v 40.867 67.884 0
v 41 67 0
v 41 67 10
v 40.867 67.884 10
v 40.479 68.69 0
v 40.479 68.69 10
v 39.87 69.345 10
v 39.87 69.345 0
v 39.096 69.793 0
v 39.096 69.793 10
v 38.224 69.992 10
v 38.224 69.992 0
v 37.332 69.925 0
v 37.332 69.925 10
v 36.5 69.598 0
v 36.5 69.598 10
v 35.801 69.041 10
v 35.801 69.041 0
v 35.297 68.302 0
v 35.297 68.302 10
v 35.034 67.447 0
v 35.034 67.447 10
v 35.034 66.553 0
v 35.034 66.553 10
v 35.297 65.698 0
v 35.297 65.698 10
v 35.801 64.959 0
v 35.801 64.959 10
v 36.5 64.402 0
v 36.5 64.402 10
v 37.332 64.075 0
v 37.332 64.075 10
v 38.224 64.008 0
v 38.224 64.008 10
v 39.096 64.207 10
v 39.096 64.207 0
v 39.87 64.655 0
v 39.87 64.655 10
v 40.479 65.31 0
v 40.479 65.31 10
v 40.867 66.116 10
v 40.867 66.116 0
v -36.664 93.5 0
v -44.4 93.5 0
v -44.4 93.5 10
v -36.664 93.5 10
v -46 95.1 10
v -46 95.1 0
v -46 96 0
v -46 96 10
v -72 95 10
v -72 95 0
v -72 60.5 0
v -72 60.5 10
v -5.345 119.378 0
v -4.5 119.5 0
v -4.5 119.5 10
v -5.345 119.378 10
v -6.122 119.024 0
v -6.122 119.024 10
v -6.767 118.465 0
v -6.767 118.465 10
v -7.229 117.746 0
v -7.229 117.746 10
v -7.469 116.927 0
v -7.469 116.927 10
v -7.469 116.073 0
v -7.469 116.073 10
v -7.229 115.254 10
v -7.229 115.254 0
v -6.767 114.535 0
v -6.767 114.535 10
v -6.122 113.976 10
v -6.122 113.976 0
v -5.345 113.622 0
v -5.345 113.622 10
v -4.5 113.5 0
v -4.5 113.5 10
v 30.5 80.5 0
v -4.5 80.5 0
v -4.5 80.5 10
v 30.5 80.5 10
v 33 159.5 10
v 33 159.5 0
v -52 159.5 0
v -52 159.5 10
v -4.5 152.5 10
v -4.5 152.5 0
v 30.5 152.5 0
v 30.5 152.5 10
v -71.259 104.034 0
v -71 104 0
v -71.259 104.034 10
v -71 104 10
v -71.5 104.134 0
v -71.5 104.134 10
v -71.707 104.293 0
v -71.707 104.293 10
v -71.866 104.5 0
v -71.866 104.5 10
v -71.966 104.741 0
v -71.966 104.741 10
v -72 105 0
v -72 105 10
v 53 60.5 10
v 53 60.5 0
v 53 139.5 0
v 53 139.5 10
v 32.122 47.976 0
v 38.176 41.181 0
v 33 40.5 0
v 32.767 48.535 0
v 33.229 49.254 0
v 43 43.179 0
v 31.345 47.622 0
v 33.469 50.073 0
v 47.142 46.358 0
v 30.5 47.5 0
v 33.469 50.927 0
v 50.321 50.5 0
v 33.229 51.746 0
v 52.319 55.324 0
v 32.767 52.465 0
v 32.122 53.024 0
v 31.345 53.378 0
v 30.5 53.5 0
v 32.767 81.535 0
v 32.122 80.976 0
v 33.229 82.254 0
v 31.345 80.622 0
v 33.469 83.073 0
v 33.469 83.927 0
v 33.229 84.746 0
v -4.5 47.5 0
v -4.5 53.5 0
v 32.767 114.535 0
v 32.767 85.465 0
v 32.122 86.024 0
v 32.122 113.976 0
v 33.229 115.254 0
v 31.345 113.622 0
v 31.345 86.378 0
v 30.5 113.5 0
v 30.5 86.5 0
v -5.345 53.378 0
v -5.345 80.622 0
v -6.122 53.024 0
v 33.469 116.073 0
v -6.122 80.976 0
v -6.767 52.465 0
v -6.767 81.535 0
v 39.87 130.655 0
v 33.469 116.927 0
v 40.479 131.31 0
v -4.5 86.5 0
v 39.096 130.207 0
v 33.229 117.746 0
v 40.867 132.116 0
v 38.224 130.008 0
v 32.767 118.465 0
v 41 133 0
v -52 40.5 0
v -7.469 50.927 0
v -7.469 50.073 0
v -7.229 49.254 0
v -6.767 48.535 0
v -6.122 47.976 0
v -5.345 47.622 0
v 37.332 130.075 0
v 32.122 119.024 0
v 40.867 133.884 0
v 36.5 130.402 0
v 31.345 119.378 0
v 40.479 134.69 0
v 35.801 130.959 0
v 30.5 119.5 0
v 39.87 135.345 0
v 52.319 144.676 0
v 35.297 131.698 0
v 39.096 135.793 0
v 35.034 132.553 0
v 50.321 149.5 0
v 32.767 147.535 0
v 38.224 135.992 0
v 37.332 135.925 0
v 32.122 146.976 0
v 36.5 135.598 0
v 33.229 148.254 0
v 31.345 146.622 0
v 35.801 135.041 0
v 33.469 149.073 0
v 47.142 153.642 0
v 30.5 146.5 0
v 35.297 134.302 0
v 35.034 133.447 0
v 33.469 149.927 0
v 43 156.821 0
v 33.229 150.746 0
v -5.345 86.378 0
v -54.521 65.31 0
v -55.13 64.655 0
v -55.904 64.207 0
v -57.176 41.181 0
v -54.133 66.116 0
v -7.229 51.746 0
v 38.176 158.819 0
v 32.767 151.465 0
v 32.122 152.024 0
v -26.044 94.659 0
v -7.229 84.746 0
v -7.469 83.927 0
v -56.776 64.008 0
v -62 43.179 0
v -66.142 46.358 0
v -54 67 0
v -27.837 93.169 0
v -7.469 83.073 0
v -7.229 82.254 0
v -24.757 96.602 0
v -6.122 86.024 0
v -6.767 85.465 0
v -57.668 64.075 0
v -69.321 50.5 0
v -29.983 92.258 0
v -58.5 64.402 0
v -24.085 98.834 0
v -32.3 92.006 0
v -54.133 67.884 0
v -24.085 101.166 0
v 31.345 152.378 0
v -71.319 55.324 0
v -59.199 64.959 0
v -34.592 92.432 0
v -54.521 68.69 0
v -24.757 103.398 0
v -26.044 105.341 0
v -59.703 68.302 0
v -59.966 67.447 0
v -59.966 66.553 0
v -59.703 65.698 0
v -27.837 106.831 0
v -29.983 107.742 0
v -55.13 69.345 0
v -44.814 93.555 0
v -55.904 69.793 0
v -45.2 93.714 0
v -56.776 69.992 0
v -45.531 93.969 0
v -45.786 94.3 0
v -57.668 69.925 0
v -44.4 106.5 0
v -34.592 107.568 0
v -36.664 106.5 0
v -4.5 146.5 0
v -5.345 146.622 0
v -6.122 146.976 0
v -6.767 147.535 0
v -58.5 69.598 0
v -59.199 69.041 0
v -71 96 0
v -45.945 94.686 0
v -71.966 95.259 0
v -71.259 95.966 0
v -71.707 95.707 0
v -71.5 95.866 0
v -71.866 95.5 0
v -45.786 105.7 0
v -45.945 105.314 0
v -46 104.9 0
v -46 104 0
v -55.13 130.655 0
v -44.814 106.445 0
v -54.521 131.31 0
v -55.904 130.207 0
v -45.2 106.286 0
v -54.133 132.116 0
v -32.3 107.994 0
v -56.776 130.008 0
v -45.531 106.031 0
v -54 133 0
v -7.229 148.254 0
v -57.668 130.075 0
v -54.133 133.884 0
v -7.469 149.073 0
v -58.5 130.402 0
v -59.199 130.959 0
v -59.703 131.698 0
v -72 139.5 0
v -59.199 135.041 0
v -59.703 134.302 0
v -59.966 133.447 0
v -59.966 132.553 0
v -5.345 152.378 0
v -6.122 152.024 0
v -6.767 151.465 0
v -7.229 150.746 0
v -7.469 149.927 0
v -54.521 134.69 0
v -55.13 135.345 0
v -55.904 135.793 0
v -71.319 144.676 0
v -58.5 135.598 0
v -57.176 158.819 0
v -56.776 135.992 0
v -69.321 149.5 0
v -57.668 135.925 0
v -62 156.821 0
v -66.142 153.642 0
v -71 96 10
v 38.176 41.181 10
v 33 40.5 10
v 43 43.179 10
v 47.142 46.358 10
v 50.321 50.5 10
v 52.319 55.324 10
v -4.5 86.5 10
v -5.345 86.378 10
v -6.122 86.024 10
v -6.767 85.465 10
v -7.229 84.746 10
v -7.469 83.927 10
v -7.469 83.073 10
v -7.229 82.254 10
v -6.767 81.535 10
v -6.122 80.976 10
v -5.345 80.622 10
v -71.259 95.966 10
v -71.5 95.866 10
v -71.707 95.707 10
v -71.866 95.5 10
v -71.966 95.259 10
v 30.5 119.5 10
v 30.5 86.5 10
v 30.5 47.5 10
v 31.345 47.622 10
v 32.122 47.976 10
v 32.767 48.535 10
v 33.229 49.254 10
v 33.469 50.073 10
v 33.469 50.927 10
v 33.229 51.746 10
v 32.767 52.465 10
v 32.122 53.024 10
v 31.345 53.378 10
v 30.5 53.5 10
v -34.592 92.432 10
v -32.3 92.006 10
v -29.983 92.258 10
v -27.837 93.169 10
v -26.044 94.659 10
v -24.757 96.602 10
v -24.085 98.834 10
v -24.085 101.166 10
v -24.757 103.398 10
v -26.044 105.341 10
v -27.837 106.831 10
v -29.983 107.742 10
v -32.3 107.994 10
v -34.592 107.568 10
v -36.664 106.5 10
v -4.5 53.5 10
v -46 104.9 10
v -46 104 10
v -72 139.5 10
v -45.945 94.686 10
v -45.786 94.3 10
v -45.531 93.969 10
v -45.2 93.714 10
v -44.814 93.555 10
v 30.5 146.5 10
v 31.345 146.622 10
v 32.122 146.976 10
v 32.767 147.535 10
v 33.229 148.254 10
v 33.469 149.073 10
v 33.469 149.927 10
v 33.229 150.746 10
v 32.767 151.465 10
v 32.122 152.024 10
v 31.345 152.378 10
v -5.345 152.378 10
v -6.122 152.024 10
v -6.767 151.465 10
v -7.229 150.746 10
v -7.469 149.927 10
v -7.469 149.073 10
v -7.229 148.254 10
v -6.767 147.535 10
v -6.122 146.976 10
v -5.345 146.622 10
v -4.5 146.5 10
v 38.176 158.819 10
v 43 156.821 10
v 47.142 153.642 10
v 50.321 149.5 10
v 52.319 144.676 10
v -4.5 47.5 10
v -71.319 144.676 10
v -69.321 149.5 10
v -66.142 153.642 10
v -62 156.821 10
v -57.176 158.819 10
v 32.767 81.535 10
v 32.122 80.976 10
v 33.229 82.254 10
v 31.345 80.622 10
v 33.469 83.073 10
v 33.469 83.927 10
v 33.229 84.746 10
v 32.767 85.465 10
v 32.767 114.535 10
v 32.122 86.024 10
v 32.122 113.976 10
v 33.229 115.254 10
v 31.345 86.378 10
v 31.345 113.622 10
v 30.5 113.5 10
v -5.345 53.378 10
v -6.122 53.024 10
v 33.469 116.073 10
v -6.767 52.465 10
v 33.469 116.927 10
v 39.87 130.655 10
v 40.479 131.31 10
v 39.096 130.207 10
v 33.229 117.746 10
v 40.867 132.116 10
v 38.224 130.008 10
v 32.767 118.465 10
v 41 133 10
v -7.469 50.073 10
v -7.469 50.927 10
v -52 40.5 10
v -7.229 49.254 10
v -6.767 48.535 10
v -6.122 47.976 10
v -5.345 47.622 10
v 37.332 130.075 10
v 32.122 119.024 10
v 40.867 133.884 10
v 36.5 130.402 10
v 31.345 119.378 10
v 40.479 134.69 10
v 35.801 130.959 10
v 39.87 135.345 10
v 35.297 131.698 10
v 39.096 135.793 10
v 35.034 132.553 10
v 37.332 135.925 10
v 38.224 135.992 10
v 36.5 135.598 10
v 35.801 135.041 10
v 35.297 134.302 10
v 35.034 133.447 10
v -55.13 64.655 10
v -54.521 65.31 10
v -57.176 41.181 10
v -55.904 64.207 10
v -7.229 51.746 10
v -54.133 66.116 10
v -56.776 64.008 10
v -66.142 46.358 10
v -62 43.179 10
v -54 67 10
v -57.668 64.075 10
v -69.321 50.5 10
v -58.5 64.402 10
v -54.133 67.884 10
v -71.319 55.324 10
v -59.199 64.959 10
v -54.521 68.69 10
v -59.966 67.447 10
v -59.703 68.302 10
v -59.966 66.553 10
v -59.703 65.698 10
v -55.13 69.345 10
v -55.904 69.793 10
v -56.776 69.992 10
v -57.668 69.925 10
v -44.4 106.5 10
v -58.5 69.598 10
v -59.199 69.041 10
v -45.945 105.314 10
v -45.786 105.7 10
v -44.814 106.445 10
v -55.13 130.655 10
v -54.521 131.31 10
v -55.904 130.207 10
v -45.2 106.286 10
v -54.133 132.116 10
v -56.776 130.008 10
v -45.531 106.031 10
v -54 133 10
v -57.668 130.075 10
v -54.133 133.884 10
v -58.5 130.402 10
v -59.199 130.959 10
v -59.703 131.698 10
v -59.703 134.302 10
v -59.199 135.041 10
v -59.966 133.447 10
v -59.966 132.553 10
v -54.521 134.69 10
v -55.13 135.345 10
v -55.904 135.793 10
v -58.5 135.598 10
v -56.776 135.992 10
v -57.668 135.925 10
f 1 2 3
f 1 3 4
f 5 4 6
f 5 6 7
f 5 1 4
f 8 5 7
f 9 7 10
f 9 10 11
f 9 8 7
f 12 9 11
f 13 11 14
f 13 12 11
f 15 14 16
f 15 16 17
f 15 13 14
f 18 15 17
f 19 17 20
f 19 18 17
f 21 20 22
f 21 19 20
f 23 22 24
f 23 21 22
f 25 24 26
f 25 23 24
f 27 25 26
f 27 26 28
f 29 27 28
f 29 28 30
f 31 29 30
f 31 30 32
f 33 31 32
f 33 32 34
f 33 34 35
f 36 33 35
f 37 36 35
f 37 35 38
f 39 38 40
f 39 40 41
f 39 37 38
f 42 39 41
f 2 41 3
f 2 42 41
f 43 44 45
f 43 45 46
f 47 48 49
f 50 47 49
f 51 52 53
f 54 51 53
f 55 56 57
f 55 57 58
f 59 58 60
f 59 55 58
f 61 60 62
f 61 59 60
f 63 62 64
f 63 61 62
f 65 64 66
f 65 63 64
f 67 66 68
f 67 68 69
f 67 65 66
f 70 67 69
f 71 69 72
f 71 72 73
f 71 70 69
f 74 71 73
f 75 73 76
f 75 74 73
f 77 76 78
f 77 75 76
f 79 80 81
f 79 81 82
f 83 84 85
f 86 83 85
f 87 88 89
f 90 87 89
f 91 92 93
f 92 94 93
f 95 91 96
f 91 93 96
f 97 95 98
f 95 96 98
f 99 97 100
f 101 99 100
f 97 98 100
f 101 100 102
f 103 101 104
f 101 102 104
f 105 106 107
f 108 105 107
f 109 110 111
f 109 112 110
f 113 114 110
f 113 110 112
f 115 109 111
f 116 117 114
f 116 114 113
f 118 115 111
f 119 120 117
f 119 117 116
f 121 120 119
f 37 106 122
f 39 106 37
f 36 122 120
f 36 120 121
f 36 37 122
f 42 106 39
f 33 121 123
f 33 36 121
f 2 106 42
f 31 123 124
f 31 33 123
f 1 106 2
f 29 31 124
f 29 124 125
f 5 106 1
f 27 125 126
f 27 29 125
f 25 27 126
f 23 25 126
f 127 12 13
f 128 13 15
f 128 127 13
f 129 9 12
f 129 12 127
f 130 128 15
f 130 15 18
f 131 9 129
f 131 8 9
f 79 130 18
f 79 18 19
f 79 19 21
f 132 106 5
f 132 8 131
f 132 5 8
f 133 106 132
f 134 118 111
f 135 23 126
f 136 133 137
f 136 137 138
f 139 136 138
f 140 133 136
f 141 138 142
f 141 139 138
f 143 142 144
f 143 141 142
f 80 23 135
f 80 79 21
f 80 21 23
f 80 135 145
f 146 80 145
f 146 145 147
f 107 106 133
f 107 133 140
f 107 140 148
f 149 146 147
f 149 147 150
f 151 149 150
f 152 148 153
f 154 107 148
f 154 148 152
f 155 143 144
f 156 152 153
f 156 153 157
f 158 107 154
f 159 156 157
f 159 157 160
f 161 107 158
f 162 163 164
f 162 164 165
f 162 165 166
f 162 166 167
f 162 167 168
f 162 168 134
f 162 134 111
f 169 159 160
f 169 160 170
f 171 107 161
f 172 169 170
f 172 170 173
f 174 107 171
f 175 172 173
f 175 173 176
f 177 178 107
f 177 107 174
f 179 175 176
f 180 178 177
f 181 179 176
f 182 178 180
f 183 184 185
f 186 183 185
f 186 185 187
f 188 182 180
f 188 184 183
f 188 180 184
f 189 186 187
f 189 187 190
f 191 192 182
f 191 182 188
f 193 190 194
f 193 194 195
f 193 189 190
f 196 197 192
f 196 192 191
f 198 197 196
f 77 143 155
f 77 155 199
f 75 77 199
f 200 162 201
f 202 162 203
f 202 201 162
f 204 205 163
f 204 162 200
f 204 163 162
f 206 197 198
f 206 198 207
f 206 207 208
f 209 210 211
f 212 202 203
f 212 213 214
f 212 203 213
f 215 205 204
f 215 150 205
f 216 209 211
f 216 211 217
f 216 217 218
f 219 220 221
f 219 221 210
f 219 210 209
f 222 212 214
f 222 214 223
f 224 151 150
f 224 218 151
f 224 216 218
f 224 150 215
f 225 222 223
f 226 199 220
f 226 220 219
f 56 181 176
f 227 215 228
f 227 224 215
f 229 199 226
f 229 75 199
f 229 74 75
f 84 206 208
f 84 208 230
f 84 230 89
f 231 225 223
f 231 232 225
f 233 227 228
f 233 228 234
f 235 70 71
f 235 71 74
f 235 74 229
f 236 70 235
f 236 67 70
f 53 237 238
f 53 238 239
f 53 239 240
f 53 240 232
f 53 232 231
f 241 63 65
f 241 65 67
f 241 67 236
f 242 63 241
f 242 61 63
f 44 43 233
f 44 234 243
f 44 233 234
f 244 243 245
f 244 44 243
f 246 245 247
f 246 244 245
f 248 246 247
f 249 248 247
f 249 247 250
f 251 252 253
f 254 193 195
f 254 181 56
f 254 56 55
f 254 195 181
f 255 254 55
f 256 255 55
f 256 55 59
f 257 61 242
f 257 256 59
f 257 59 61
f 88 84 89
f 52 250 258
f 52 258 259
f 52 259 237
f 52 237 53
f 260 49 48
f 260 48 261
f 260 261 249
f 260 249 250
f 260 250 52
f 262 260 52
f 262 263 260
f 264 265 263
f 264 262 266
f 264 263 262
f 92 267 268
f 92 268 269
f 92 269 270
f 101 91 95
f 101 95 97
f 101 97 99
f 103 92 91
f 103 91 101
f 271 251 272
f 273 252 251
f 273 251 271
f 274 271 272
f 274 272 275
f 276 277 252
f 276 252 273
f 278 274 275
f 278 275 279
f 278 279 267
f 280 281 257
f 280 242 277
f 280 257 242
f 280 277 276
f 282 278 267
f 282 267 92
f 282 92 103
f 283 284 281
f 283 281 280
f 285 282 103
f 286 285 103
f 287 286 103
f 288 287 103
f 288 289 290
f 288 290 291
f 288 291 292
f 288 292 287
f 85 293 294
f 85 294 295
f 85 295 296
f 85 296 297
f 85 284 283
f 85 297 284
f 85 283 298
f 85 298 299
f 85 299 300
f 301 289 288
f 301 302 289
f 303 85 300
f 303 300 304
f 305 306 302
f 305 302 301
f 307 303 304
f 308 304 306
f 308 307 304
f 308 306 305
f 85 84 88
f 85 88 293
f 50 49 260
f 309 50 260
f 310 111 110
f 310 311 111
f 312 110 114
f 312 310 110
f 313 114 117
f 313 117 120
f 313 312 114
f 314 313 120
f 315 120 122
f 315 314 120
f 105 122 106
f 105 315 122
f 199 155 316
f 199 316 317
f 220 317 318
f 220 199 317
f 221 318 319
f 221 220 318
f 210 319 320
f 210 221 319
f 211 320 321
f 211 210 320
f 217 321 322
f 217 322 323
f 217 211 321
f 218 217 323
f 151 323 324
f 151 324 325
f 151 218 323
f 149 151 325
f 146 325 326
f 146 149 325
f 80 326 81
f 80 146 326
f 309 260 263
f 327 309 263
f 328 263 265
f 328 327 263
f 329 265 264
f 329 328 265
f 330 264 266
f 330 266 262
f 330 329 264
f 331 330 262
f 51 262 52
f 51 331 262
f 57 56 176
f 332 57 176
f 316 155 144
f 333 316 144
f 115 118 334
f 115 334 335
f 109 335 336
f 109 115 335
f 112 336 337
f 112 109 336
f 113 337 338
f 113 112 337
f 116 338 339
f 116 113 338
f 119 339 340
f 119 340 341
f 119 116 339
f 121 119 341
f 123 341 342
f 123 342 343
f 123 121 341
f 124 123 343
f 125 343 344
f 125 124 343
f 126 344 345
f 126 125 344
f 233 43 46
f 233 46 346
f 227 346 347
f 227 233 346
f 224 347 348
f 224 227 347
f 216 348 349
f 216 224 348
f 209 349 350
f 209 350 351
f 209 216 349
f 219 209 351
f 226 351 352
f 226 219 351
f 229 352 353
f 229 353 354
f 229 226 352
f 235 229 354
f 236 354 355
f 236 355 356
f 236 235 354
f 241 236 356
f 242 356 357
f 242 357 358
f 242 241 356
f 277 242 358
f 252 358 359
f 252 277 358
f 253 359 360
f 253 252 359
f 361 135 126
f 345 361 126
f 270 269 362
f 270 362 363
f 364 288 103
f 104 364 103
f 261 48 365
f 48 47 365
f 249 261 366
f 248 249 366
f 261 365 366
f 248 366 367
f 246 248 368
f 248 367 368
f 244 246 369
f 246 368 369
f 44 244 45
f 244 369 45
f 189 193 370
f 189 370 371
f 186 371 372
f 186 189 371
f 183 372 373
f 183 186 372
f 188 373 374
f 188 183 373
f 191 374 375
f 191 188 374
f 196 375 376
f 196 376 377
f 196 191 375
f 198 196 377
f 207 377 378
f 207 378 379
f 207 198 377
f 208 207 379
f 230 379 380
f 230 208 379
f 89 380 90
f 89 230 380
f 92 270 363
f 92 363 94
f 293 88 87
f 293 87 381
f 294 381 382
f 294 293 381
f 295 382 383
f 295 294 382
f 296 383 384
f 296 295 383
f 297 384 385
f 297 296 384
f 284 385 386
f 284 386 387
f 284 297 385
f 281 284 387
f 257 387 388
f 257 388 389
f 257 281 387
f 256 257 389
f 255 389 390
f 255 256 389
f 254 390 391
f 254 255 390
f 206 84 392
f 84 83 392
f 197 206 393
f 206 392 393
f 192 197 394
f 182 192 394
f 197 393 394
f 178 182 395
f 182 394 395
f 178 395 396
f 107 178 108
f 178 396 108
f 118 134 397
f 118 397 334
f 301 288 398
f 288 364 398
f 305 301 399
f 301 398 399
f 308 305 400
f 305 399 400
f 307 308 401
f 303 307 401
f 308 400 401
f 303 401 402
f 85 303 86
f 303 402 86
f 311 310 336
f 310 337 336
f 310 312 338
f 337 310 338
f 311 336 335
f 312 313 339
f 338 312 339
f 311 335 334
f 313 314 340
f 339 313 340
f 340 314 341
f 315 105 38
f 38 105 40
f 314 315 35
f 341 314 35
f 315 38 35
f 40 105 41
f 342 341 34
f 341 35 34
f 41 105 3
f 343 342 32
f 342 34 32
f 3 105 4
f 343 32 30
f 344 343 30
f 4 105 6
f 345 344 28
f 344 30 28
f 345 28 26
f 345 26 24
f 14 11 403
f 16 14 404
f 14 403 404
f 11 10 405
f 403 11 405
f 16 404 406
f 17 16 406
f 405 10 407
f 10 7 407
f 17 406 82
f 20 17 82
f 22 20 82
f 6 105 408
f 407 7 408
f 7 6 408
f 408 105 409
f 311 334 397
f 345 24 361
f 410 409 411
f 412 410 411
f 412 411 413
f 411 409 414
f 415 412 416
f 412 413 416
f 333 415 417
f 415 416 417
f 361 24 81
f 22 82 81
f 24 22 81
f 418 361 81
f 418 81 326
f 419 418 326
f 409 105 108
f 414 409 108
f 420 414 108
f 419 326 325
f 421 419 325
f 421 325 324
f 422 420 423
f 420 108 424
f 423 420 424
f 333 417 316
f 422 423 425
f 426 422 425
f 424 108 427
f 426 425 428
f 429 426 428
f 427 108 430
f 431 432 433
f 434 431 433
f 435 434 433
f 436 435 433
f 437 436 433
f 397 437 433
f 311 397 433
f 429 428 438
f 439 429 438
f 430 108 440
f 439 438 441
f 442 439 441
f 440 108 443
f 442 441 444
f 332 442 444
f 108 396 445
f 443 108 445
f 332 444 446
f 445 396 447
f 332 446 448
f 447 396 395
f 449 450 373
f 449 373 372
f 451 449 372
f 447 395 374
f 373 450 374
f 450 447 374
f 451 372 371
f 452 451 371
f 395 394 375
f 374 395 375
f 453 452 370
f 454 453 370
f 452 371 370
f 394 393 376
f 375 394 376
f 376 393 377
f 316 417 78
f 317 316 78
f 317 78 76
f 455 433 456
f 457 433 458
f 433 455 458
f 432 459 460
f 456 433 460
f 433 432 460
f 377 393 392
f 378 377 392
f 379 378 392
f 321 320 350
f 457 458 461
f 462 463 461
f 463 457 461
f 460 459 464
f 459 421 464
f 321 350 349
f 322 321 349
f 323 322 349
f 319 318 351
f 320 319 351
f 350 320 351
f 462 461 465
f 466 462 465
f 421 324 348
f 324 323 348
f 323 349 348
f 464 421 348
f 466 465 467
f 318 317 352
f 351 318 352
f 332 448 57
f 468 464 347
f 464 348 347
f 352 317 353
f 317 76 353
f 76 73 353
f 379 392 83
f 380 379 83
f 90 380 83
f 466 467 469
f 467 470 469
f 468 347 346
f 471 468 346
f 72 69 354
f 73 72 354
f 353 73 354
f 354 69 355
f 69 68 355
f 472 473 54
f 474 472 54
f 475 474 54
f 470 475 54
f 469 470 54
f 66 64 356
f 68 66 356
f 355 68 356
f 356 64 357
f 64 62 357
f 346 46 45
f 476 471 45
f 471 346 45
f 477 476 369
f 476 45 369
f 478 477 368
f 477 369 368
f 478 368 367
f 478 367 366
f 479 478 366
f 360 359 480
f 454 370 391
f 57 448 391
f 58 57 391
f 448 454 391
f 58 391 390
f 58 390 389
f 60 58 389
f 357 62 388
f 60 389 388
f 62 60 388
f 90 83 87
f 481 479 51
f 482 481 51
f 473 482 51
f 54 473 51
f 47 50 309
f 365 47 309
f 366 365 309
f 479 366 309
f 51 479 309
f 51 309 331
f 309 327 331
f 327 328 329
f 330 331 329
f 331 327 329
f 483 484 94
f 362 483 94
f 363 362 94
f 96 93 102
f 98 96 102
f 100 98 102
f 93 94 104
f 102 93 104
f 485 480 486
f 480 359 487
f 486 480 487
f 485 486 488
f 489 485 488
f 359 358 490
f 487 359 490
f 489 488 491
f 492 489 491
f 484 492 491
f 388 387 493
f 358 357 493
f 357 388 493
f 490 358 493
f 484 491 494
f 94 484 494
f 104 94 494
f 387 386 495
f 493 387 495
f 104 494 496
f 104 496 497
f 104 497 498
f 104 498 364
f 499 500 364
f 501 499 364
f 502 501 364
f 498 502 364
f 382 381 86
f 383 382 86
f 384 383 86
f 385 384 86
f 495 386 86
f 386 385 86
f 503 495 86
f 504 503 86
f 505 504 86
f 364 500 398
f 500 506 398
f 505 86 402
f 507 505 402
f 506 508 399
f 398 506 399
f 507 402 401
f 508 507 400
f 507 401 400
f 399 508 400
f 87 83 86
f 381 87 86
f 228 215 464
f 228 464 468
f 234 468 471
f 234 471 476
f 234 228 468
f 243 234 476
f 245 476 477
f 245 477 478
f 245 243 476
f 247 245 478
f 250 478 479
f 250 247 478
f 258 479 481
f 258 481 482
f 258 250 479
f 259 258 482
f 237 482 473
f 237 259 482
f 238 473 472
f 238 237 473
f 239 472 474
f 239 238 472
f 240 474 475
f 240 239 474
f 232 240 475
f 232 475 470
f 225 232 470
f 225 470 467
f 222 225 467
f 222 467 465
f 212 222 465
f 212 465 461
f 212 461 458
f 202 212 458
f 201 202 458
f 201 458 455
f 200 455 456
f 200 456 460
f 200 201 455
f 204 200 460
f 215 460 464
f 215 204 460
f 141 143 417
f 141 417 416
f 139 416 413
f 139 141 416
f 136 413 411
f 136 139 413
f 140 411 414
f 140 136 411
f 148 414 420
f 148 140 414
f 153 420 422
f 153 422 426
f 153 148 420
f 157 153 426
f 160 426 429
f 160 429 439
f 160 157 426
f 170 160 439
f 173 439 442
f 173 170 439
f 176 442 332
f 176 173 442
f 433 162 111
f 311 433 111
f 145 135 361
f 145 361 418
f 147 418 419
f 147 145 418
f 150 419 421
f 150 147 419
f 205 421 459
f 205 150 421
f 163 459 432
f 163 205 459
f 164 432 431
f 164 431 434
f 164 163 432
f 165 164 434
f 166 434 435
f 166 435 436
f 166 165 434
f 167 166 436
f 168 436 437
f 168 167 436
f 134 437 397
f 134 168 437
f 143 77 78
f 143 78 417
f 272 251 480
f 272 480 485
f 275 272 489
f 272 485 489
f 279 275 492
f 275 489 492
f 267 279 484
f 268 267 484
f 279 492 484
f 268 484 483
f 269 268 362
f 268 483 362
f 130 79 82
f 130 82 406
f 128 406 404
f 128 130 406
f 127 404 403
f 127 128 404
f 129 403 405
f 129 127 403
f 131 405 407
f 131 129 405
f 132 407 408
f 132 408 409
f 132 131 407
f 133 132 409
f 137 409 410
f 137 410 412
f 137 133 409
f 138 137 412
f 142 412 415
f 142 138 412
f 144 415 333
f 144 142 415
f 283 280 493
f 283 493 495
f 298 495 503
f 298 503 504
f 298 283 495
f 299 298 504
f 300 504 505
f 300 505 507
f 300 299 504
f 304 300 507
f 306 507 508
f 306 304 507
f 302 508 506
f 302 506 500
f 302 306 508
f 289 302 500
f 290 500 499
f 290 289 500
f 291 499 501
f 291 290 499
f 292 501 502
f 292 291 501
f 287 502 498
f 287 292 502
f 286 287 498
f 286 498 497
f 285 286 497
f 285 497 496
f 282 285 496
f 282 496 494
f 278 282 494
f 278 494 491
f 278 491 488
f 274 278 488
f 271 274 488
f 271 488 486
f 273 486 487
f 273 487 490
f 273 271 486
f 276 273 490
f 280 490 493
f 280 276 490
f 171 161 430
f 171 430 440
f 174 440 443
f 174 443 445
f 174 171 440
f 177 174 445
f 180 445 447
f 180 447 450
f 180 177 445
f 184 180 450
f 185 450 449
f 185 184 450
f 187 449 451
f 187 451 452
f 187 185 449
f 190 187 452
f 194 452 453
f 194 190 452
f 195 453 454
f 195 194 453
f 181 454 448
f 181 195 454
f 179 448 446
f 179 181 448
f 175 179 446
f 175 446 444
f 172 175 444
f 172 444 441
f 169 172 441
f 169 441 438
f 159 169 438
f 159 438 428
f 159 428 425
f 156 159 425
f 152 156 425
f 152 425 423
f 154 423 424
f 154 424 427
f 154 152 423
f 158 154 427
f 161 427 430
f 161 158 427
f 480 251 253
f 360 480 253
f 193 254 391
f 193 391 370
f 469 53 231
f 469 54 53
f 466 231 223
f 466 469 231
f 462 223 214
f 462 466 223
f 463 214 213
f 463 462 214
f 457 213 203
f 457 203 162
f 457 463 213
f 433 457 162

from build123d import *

# Parameters (mm, degrees)
SKETCH_R    = 3
PAD_DEPTH   = 10
FILLET_R    = 20
FILLET001_R = 1.6
FILLET002_R = 1


with BuildPart() as part:
    # Sketch → Pad (new body)
    with BuildSketch(Plane.XY):
        with BuildLine():
            ThreePointArc((-36.66369, 93.5), (-24, 100), (-36.66369, 106.5))
            Line((-46, 106.5), (-36.66369, 106.5))
            Line((-46, 106.5), (-46, 104))
            Line((-46, 104), (-72, 104))
            Line((-72, 159.5), (-72, 104))
            Line((53, 159.5), (-72, 159.5))
            Line((53, 40.5), (53, 159.5))
            Line((-72, 40.5), (53, 40.5))
            Line((-72, 96), (-72, 40.5))
            Line((-46, 96), (-72, 96))
            Line((-46, 93.5), (-46, 96))
            Line((-46, 93.5), (-36.66369, 93.5))
        make_face()
        with Locations((-57, 133)):
            Circle(SKETCH_R, mode=Mode.SUBTRACT)
        with Locations((-57, 67)):
            Circle(SKETCH_R, mode=Mode.SUBTRACT)
        with Locations((38, 133)):
            Circle(SKETCH_R, mode=Mode.SUBTRACT)
        with Locations((38, 67)):
            Circle(SKETCH_R, mode=Mode.SUBTRACT)
        with BuildLine():
            ThreePointArc((-4.5, 152.5), (-7.5, 149.5), (-4.5, 146.5))
            Line((-4.5, 146.5), (30.5, 146.5))
            ThreePointArc((30.5, 146.5), (33.5, 149.5), (30.5, 152.5))
            Line((-4.5, 152.5), (30.5, 152.5))
        make_face(mode=Mode.SUBTRACT)
        with BuildLine():
            ThreePointArc((-4.5, 119.5), (-7.5, 116.5), (-4.5, 113.5))
            Line((-4.5, 113.5), (30.5, 113.5))
            ThreePointArc((30.5, 113.5), (33.5, 116.5), (30.5, 119.5))
            Line((-4.5, 119.5), (30.5, 119.5))
        make_face(mode=Mode.SUBTRACT)
        with BuildLine():
            ThreePointArc((-4.5, 86.5), (-7.5, 83.5), (-4.5, 80.5))
            Line((-4.5, 80.5), (30.5, 80.5))
            ThreePointArc((30.5, 80.5), (33.5, 83.5), (30.5, 86.5))
            Line((-4.5, 86.5), (30.5, 86.5))
        make_face(mode=Mode.SUBTRACT)
        with BuildLine():
            ThreePointArc((-4.5, 53.5), (-7.5, 50.5), (-4.5, 47.5))
            Line((-4.5, 47.5), (30.5, 47.5))
            ThreePointArc((30.5, 47.5), (33.5, 50.5), (30.5, 53.5))
            Line((-4.5, 53.5), (30.5, 53.5))
        make_face(mode=Mode.SUBTRACT)
    extrude(amount=PAD_DEPTH)

    # Fillet
    fillet_edges = [part.edges().sort_by_distance(p)[0] for p in [
        (-72, 159.5, 5),
        (53, 40.5, 5),
        (-72, 40.5, 5),
        (53, 159.5, 5),
    ]]
    fillet(fillet_edges, radius=FILLET_R)

    # Fillet001
    fillet001_edges = [part.edges().sort_by_distance(p)[0] for p in [
        (-46, 106.5, 5),
        (-46, 93.5, 5),
    ]]
    fillet(fillet001_edges, radius=FILLET001_R)

    # Fillet002
    fillet002_edges = [part.edges().sort_by_distance(p)[0] for p in [
        (-72, 104, 5),
        (-72, 96, 5),
    ]]
    fillet(fillet002_edges, radius=FILLET002_R)


solid = part.part
